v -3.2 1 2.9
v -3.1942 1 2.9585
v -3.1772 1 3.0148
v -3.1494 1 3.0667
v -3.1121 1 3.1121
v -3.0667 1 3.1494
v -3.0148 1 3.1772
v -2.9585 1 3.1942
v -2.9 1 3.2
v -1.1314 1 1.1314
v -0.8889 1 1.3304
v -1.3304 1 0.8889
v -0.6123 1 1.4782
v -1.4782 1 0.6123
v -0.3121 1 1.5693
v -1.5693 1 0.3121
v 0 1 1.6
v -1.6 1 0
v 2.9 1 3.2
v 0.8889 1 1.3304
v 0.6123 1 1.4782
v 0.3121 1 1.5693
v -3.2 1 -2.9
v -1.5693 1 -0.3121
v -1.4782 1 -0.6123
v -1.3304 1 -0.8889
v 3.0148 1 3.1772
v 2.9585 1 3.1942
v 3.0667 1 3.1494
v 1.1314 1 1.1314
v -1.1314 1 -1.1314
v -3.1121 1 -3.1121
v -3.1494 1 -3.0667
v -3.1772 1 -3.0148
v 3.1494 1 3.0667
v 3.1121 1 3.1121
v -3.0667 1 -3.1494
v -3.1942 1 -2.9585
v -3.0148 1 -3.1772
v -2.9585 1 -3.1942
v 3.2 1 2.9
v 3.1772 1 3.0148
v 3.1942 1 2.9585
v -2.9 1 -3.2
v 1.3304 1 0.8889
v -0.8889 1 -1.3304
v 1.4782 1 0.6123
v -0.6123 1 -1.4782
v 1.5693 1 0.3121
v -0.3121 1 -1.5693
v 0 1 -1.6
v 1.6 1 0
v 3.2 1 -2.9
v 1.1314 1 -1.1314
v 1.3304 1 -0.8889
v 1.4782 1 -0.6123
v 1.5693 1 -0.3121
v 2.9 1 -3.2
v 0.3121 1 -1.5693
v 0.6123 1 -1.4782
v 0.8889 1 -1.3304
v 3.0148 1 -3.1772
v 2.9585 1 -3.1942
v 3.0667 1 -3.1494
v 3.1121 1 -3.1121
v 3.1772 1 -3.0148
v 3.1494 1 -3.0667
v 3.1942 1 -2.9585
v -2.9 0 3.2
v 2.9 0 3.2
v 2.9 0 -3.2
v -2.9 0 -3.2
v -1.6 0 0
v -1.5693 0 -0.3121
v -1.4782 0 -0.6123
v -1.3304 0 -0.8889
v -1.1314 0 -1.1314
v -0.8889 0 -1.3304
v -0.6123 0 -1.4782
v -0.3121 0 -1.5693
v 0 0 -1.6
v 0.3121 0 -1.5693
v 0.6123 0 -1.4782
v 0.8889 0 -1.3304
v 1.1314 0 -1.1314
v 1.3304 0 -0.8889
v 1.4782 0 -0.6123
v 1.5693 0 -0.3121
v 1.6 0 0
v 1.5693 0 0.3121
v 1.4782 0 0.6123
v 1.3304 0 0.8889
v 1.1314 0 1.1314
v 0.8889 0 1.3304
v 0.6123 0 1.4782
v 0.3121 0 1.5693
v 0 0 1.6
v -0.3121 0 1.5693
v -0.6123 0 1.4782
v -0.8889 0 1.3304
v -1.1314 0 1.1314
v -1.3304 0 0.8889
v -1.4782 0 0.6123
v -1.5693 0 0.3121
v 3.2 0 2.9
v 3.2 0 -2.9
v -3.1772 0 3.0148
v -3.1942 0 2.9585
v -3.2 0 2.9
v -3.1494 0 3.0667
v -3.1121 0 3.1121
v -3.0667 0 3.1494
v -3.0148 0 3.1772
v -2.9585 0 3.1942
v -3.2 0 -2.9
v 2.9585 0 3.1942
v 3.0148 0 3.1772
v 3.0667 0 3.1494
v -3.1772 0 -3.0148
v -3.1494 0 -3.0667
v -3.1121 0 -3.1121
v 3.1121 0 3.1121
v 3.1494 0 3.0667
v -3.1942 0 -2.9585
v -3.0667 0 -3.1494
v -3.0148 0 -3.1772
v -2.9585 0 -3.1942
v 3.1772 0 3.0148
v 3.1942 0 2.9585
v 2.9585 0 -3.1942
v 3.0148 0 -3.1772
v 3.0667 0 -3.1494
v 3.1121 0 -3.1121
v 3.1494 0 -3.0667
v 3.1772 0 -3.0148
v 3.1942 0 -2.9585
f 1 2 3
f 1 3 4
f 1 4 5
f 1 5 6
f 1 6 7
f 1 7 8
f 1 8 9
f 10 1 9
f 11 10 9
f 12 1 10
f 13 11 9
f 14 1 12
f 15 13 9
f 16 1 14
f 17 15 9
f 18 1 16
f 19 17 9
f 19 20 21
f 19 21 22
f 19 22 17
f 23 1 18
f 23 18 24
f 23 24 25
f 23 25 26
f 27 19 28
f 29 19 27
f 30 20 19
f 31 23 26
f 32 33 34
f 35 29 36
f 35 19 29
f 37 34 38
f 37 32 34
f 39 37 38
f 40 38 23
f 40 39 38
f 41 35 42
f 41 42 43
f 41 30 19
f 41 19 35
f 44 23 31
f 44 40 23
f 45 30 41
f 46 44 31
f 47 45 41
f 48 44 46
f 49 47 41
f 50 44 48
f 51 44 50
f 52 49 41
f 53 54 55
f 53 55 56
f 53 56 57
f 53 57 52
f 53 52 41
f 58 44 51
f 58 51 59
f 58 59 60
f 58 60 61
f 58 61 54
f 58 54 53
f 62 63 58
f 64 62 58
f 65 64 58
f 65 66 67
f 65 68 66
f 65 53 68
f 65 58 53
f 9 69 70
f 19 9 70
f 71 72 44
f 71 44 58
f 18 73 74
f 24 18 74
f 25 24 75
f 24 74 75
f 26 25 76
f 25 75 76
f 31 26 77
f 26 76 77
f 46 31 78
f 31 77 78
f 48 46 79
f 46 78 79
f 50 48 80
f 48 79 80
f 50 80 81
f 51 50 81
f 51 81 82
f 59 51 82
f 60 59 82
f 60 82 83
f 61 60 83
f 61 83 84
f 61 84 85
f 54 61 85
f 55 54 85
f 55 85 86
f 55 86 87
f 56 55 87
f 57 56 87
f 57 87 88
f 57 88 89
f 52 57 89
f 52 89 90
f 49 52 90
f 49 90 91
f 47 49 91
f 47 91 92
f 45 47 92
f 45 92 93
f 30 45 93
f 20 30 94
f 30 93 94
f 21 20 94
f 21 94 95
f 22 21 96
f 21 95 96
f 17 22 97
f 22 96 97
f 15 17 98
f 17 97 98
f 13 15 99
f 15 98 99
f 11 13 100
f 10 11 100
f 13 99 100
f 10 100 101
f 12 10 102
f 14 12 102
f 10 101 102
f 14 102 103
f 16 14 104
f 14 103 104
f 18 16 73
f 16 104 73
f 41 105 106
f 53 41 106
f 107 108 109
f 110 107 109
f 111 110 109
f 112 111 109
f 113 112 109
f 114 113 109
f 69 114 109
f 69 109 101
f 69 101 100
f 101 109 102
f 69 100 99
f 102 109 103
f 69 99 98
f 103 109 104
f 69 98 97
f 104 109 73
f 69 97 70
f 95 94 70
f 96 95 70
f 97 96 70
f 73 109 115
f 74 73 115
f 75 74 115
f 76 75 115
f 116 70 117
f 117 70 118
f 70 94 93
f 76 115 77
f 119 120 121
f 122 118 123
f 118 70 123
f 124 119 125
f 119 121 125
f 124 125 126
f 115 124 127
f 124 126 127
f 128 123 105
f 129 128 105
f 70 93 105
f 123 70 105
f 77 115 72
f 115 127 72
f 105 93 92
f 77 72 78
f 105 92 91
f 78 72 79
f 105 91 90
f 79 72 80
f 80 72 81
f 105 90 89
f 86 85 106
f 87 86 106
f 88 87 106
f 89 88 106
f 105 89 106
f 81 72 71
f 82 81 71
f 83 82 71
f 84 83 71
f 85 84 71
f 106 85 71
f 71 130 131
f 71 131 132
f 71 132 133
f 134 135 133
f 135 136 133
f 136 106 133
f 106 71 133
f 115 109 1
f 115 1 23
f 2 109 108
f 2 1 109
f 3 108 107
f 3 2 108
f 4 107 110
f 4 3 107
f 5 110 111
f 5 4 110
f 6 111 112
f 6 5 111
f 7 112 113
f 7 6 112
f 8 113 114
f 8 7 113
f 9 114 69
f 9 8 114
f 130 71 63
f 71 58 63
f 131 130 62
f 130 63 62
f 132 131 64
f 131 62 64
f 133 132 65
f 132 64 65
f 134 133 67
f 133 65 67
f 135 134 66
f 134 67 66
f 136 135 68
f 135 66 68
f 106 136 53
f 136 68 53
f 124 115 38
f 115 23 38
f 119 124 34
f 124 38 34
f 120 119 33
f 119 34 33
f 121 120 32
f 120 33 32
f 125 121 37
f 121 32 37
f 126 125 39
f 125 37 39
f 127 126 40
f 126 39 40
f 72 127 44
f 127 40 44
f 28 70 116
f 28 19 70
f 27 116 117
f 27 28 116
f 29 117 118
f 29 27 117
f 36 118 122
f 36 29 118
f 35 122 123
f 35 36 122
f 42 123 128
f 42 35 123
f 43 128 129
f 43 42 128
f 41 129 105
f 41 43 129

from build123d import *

# Parameters (mm, degrees)
SKETCH1_W            = 6.4
SKETCH1_H            = 6.4
BOSS_EXTRUDE1_DEPTH  = 1
M3_CLEARANCE_HOLE1_D = 3.2
FILLET1_R            = 0.3


with BuildPart() as part:
    # Sketch1 → Boss-Extrude1 (new body)
    with BuildSketch(Plane(origin=(0, 0, 0), x_dir=(1, 0, 0), z_dir=(0, 1, 0))):
        Rectangle(SKETCH1_W, SKETCH1_H)
    extrude(amount=BOSS_EXTRUDE1_DEPTH)

    # M3 Clearance Hole1 (through all)
    with Locations(Plane(origin=(0, 1, 0), x_dir=(1, 0, 0), z_dir=(0, 1, 0))):
        with Locations((0, 0)):
            Hole(M3_CLEARANCE_HOLE1_D / 2)

    # Fillet1
    fillet1_edges = [part.edges().sort_by_distance(p)[0] for p in [
        (3.2, 0.5, 3.2),
        (3.2, 0.5, -3.2),
        (-3.2, 0.5, -3.2),
        (-3.2, 0.5, 3.2),
    ]]
    fillet(fillet1_edges, radius=FILLET1_R)


solid = part.part
